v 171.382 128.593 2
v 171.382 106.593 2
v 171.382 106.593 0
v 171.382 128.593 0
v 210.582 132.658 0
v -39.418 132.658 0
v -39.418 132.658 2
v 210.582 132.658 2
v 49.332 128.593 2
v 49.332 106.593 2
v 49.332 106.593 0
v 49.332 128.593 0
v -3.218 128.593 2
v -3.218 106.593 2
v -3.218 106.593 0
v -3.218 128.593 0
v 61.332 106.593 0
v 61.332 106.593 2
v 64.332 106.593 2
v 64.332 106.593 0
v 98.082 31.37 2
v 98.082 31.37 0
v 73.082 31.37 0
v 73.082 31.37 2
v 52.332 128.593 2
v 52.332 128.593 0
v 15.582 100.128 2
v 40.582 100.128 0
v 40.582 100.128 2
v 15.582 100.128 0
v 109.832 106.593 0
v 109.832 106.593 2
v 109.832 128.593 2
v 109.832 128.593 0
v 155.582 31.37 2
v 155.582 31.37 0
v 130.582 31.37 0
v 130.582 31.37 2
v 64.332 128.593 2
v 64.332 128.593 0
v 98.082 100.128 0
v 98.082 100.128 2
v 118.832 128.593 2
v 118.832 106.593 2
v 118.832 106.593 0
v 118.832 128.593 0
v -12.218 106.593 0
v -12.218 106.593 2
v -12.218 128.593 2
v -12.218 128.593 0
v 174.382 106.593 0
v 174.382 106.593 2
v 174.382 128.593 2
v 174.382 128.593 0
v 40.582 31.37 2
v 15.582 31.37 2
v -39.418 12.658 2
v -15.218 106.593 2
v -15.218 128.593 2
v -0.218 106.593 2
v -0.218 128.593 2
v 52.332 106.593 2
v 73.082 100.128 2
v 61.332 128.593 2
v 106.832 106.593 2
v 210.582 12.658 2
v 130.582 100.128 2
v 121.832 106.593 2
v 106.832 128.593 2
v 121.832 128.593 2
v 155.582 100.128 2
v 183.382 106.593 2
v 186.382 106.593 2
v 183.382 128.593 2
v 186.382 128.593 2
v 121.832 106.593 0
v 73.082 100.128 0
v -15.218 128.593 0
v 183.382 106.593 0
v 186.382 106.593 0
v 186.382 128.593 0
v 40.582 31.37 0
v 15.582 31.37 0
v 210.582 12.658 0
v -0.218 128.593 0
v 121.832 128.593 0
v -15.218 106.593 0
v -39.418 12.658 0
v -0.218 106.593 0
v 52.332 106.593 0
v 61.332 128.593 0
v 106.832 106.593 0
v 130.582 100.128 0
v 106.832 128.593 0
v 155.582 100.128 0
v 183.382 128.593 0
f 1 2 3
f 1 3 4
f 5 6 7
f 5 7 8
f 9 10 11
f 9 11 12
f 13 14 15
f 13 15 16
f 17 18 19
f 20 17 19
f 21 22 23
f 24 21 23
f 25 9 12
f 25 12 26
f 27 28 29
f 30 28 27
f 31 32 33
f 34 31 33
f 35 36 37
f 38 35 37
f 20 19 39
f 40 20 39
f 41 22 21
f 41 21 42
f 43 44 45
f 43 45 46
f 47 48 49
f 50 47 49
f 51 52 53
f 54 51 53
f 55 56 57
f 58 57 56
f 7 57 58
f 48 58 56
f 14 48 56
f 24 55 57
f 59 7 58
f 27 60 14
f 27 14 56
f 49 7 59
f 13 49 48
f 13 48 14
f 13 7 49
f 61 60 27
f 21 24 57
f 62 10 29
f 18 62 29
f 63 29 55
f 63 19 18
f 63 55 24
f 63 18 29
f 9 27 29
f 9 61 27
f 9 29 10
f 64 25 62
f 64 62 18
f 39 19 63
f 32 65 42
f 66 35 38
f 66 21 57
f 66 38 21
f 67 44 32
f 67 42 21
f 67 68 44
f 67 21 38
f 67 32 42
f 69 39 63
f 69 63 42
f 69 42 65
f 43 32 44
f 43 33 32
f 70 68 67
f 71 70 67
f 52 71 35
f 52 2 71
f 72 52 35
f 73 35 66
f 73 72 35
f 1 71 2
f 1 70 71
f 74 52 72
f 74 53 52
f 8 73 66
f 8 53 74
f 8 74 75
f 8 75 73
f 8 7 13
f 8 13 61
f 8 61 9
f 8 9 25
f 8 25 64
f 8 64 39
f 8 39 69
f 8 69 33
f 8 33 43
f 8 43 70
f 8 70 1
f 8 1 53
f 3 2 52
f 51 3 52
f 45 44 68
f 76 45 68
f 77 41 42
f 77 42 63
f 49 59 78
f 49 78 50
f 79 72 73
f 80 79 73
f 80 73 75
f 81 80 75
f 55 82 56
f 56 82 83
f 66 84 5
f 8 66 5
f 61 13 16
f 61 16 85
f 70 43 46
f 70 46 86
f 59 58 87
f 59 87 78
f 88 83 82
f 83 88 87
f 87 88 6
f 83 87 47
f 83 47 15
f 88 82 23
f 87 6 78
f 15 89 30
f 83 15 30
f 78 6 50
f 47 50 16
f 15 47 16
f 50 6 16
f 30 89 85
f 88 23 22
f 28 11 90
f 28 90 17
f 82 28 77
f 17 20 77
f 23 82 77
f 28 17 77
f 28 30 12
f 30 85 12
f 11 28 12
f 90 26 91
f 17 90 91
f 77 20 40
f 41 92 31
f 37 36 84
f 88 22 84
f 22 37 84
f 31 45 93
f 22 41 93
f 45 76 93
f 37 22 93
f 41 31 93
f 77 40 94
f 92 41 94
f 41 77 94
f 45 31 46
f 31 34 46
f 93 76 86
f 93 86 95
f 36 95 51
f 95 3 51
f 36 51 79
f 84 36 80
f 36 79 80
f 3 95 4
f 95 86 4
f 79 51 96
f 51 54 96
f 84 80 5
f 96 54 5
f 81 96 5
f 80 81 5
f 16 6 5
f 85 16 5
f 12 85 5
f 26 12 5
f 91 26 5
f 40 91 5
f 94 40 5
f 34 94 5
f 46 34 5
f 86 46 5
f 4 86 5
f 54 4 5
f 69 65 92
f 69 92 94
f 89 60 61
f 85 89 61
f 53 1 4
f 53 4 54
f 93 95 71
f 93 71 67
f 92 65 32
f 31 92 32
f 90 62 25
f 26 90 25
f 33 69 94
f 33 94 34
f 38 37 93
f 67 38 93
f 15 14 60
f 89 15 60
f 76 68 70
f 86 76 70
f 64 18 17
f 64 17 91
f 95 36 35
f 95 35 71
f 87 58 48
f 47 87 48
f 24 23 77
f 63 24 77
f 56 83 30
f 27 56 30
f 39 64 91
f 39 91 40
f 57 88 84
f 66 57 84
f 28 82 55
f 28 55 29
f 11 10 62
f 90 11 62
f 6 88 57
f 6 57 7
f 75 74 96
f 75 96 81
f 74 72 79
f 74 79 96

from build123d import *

# Parameters (mm, degrees)
SKETCH_1_W          = 250
SKETCH_1_H          = 120
EXTRUDE_1_DEPTH     = 2
SKETCH_2_W          = 3
SKETCH_2_H          = 22
CUT_EXTRUDE_1_DEPTH = 2
SKETCH_4_W          = 25
SKETCH_4_H          = 68.757414634
CUT_EXTRUDE_3_DEPTH = 10


with BuildPart() as part:
    # 草图1 → 凸台-拉伸1 (new body)
    with BuildSketch(Plane.XY):
        with Locations((85.581519181, 72.657914473)):
            Rectangle(SKETCH_1_W, SKETCH_1_H)
    extrude(amount=EXTRUDE_1_DEPTH)

    # 草图2 → 切除-拉伸1 (cut)
    with BuildSketch(Plane.XY.offset(2)):
        with Locations((-13.718480819, 117.592867426)):
            Rectangle(SKETCH_2_W, SKETCH_2_H)
        with Locations((-1.718480819, 117.592867426)):
            Rectangle(SKETCH_2_W, SKETCH_2_H)
        with Locations((50.831519181, 117.592867426)):
            Rectangle(SKETCH_2_W, SKETCH_2_H)
        with Locations((62.831519181, 117.592867426)):
            Rectangle(SKETCH_2_W, SKETCH_2_H)
        with Locations((108.331519181, 117.592867426)):
            Rectangle(SKETCH_2_W, SKETCH_2_H)
        with Locations((120.331519181, 117.592867426)):
            Rectangle(SKETCH_2_W, SKETCH_2_H)
        with Locations((172.881519181, 117.592867426)):
            Rectangle(SKETCH_2_W, SKETCH_2_H)
        with Locations((184.881519181, 117.592867426)):
            Rectangle(SKETCH_2_W, SKETCH_2_H)
    extrude(amount=-CUT_EXTRUDE_1_DEPTH, mode=Mode.SUBTRACT)

    # 草图4 → 切除-拉伸3 (cut)
    with BuildSketch(Plane(origin=(0, 0, 0), x_dir=(-1, 0, 0), z_dir=(0, 0, -1))):
        with Locations((-143.081519181, 65.748927638)):
            Rectangle(SKETCH_4_W, SKETCH_4_H)
        with Locations((-85.581519181, 65.748927638)):
            Rectangle(SKETCH_4_W, SKETCH_4_H)
        with Locations((-28.081519181, 65.748927638)):
            Rectangle(SKETCH_4_W, SKETCH_4_H)
    extrude(amount=-CUT_EXTRUDE_3_DEPTH, mode=Mode.SUBTRACT)


solid = part.part
